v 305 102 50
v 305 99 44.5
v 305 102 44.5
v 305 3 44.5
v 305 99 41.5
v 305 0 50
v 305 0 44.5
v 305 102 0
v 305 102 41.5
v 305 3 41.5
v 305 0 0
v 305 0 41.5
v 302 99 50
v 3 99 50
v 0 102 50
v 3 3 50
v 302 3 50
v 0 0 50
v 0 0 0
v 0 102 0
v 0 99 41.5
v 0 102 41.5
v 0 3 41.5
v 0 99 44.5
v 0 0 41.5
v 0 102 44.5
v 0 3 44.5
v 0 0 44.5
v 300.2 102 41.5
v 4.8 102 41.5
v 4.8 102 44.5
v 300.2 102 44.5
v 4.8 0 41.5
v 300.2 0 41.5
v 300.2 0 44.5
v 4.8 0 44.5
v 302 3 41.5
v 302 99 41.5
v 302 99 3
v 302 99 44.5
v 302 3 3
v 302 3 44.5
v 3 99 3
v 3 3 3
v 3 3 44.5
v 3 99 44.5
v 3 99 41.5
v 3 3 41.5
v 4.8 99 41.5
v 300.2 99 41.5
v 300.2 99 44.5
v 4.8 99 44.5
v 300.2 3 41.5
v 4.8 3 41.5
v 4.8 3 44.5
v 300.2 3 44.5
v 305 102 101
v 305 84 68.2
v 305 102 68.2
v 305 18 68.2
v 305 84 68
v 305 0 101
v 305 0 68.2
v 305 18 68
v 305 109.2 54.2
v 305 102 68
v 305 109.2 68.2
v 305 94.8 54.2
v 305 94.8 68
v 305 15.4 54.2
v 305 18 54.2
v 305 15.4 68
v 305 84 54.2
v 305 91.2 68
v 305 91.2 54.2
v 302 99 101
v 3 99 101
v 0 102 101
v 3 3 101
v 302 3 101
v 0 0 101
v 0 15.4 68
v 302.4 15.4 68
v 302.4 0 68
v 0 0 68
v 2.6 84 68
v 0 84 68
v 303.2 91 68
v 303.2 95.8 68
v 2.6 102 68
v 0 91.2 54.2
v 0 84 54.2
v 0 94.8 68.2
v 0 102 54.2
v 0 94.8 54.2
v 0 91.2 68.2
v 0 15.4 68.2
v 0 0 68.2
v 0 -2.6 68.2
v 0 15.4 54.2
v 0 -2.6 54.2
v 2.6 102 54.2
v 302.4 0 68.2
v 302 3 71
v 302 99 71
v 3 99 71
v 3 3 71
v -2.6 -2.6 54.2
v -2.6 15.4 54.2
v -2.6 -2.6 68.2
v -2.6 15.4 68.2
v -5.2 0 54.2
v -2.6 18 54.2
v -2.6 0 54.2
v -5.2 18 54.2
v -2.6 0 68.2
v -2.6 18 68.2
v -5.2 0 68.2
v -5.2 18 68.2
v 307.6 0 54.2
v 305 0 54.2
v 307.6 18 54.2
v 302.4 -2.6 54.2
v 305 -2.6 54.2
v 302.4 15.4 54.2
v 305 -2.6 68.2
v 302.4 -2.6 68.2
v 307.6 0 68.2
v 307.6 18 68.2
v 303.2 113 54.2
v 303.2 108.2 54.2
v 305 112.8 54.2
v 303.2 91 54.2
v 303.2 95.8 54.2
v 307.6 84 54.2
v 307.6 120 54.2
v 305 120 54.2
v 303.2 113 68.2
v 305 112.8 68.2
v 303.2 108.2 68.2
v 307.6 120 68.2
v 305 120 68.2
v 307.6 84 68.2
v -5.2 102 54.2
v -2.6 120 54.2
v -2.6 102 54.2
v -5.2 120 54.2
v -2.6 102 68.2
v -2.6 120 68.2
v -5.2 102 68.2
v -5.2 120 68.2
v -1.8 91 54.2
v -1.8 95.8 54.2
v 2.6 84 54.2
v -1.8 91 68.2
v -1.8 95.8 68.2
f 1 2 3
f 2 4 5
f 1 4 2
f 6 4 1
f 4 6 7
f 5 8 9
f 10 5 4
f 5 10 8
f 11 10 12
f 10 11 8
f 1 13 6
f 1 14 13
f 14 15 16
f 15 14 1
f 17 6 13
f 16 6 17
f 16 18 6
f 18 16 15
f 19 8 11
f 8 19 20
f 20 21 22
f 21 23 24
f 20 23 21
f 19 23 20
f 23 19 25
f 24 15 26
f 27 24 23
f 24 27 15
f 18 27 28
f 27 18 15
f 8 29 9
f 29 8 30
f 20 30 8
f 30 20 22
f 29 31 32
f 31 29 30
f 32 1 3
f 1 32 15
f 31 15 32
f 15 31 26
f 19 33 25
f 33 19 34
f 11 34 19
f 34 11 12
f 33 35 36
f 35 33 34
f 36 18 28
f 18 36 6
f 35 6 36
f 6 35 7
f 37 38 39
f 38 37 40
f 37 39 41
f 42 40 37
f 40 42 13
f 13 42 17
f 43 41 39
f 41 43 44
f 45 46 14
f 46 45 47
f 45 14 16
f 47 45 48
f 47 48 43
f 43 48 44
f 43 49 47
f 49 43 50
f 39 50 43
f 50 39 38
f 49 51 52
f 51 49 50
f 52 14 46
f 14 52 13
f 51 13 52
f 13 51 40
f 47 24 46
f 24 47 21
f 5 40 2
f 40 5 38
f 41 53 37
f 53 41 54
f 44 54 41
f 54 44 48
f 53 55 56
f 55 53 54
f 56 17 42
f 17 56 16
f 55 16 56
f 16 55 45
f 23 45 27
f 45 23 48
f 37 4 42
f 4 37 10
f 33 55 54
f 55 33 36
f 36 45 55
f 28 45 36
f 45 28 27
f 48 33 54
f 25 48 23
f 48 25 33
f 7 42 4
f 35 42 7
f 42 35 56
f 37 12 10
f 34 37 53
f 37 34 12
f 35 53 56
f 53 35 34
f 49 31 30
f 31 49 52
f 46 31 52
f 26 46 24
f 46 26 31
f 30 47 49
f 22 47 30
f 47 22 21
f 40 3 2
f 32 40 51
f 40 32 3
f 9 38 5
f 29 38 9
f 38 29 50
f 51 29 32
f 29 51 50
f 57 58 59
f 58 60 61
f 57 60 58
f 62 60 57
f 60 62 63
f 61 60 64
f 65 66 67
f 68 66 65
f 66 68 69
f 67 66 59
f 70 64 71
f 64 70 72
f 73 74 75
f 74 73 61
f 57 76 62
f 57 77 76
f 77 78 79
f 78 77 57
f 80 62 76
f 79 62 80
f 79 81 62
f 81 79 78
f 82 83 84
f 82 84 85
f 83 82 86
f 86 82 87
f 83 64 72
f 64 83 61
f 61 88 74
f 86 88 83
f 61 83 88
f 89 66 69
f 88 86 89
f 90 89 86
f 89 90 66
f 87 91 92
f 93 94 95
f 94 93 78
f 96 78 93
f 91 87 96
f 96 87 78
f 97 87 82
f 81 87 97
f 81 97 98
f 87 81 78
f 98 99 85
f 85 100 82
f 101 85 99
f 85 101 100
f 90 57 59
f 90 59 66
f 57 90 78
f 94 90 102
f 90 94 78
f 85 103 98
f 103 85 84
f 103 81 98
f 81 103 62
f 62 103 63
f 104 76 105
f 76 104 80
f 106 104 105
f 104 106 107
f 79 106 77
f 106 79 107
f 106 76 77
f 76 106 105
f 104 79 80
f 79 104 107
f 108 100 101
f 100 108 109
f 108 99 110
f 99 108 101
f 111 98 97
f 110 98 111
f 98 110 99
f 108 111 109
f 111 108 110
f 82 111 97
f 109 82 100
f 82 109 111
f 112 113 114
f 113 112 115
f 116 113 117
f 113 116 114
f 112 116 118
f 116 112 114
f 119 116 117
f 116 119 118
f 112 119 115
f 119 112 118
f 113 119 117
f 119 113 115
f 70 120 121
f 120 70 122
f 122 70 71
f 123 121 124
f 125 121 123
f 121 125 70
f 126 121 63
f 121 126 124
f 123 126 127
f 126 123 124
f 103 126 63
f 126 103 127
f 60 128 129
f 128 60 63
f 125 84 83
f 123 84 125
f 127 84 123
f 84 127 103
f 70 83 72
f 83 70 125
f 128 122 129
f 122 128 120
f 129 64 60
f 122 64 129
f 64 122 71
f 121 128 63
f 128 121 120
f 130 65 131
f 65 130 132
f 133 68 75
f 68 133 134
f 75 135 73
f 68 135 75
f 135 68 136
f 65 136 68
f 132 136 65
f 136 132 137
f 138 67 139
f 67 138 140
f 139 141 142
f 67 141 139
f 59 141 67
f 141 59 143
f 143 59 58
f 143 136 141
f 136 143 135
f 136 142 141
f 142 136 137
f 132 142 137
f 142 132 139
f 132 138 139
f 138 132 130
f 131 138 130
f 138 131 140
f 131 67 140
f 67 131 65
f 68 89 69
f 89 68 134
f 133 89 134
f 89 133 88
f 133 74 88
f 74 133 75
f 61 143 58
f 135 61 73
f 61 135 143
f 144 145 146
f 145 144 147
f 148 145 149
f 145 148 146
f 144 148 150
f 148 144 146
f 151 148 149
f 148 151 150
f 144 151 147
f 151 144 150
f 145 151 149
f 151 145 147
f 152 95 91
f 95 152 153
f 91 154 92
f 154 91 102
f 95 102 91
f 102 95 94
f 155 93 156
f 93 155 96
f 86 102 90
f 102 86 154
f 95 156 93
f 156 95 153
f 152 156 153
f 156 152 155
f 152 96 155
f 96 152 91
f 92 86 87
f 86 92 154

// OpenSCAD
// 04_corner_snap_tabs.scad
// Snap-over corner tabs: four L-shaped corner clips that wrap AROUND two
// adjacent faces at each corner. Each clip has an inward-facing bead on the
// short-side arm and a lateral locking nub on the long-side arm — resisting
// both lift AND side-slide in X. The clip is integral to the upper tray.
// Engage: press upper tray straight down; ramp on bead guides past corner edge.
// Release: pull/flex the L-tab outward at the corner tip, then lift.

$fn = 36;
EXPLODE = 18;   // 0 = engaged, >0 = exploded view

/* ---- tray dimensions ---- */
LX = 305; LY = 102; LZ = 50;   // lower tray
UX = 305; UY = 102; UZ = 33;   // upper tray
W  = 3;                          // wall thickness

/* ---- clip params ---- */
CL_W  = 18;   // clip width along each face
CL_T  = 2.6;  // clip arm thickness (flex wall)
CL_H  = 14;   // clip height (overlaps lower tray top portion)
BEAD  = 1.8;  // snap bead protrusion inward
RAMP  = 2.0;  // ramp height above bead for self-guiding
NUBW  = 3.0;  // lateral anti-slide nub width  (fits a notch in the corner)
NUBH  = 1.6;  // nub height (inward protrusion)
NOTCH_D = 1.8; // notch depth in lower tray corner for anti-slide nub

// small clearance between upper and lower tray mating faces
GAP = 0.2;

module lower_tray() {
    color("SteelBlue", 0.85)
    union() {
        difference() {
            cube([LX, LY, LZ]);
            translate([W, W, W]) cube([LX-2*W, LY-2*W, LZ]);
            // four corner notches for anti-slide nub (on top band of lower tray)
            // Front-Left corner
            translate([-0.1, -0.1, LZ - CL_H/2 - NUBW/2])
                cube([W + NOTCH_D + 0.1, NUBW + 0.1, NUBW]);
            // Front-Right corner
            translate([LX - W - NOTCH_D, -0.1, LZ - CL_H/2 - NUBW/2])
                cube([W + NOTCH_D + 0.1, NUBW + 0.1, NUBW]);
            // Back-Left corner
            translate([-0.1, LY - NUBW, LZ - CL_H/2 - NUBW/2])
                cube([W + NOTCH_D + 0.1, NUBW + 0.1, NUBW]);
            // Back-Right corner
            translate([LX - W - NOTCH_D, LY - NUBW, LZ - CL_H/2 - NUBW/2])
                cube([W + NOTCH_D + 0.1, NUBW + 0.1, NUBW]);
        }
    }
}

module upper_tray() {
    color("Tomato", 0.85)
    difference() {
        cube([UX, UY, UZ]);
        translate([W, W, W]) cube([UX-2*W, UY-2*W, UZ]);
    }
}

// 2D profile of clip arm cross-section (in local XZ plane)
// arm extends outward in +X, bead protrudes inward (-X side)
// height CL_H, arm thickness CL_T
module clip_arm_profile() {
    // arm body
    square([CL_T, CL_H]);
    // snap bead: small triangular bead at mid-height (outward face = left side)
    // bead protrudes in -X direction (inward toward tray)
    bz = CL_H * 0.35;  // bead z position from bottom of clip
    polygon(points=[
        [-BEAD,        bz],
        [-BEAD,        bz + BEAD*2],
        [0,            bz + BEAD + RAMP],
        [0,            bz - RAMP*0.5]
    ]);
    // anti-slide nub at mid-height on the inner face, shifted higher
    nz = CL_H * 0.52;
    polygon(points=[
        [-NUBH,  nz],
        [-NUBH,  nz + NUBW],
        [0,      nz + NUBW],
        [0,      nz]
    ]);
}

// One L-shaped corner clip
// corner_idx: 0=front-left, 1=front-right, 2=back-right, 3=back-left
module corner_clip(corner_idx) {
    // Determine rotation and translation for each corner
    // Clip has two arms: one along X face, one along Y face, joined at corner
    color("OrangeRed", 0.92)
    if (corner_idx == 0) {
        // Front-Left: X=0, Y=0 corner; arms go right (+X) and back (+Y)
        translate([0, 0, -CL_H + GAP])
        union() {
            // Y-face arm (along front face, from X=0 to X=CL_W)
            translate([0, -CL_T, 0])
            linear_extrude(CL_H) {
                // arm extends in -Y (outward from Y=0 face)
                // bead faces +Y (inward)
                mirror([1,0]) square([CL_T, CL_W]);
                // bead
                bz2 = CL_H * 0.35;
                translate([0, CL_W * 0.4]) mirror([1,0])
                    polygon(points=[
                        [0, 0],[0, BEAD*2],[BEAD, BEAD+RAMP],[BEAD, -RAMP*0.5]
                    ]);
            }
            // X-face arm (along left face, from Y=0 to Y=CL_W)
            translate([-CL_T, 0, 0])
            rotate([0,0,0])
            linear_extrude(CL_H) {
                mirror([1,0]) square([CL_T, CL_W]);
                // bead pointing +X (inward)
                translate([0, CL_W*0.4]) mirror([1,0])
                    polygon(points=[
                        [0, 0],[0, BEAD*2],[BEAD, BEAD+RAMP],[BEAD, -RAMP*0.5]
                    ]);
            }
        }
    } else if (corner_idx == 1) {
        // Front-Right: X=UX, Y=0
        translate([UX, 0, -CL_H + GAP])
        union() {
            translate([0, -CL_T, 0])
            linear_extrude(CL_H) {
                mirror([1,0]) square([CL_T, CL_W]);
                translate([0, CL_W * 0.4]) mirror([1,0])
                    polygon(points=[
                        [0,0],[0,BEAD*2],[BEAD,BEAD+RAMP],[BEAD,-RAMP*0.5]
                    ]);
            }
            translate([0, 0, 0])
            linear_extrude(CL_H)
                union() {
                    square([CL_T, CL_W]);
                    translate([0, CL_W*0.4])
                        polygon(points=[
                            [0,0],[0,BEAD*2],[-BEAD,BEAD+RAMP],[-BEAD,-RAMP*0.5]
                        ]);
                }
        }
    } else if (corner_idx == 2) {
        // Back-Right: X=UX, Y=UY
        translate([UX, UY, -CL_H + GAP])
        union() {
            translate([0, 0, 0])
            linear_extrude(CL_H)
                union() {
                    square([CL_T, CL_W]);
                    translate([0, CL_W*0.4])
                        polygon(points=[
                            [0,0],[0,BEAD*2],[-BEAD,BEAD+RAMP],[-BEAD,-RAMP*0.5]
                        ]);
                }
            translate([0, 0, 0])
            linear_extrude(CL_H)
            rotate([0,0,0]) {
                mirror([0,1,0]) square([CL_T, CL_W]);
                mirror([0,1,0]) translate([0, CL_W*0.4])
                    polygon(points=[
                        [0,0],[0,BEAD*2],[-BEAD,BEAD+RAMP],[-BEAD,-RAMP*0.5]
                    ]);
            }
        }
    } else {
        // Back-Left: X=0, Y=UY
        translate([0, UY, -CL_H + GAP])
        union() {
            translate([-CL_T, 0, 0])
            linear_extrude(CL_H)
                union() {
                    mirror([1,0]) square([CL_T, CL_W]);
                    translate([0, CL_W*0.4]) mirror([1,0])
                        polygon(points=[
                            [0,0],[0,BEAD*2],[BEAD,BEAD+RAMP],[BEAD,-RAMP*0.5]
                        ]);
                }
            linear_extrude(CL_H)
            {
                mirror([0,1,0]) square([CL_T, CL_W]);
                mirror([0,1,0]) translate([0, CL_W*0.4])
                    polygon(points=[
                        [0,0],[0,BEAD*2],[-BEAD,BEAD+RAMP],[-BEAD,-RAMP*0.5]
                    ]);
            }
        }
    }
}

/* ---- assembly ---- */
lower_tray();

translate([0, 0, LZ + EXPLODE]) {
    upper_tray();
    for (i = [0:3]) corner_clip(i);
}
